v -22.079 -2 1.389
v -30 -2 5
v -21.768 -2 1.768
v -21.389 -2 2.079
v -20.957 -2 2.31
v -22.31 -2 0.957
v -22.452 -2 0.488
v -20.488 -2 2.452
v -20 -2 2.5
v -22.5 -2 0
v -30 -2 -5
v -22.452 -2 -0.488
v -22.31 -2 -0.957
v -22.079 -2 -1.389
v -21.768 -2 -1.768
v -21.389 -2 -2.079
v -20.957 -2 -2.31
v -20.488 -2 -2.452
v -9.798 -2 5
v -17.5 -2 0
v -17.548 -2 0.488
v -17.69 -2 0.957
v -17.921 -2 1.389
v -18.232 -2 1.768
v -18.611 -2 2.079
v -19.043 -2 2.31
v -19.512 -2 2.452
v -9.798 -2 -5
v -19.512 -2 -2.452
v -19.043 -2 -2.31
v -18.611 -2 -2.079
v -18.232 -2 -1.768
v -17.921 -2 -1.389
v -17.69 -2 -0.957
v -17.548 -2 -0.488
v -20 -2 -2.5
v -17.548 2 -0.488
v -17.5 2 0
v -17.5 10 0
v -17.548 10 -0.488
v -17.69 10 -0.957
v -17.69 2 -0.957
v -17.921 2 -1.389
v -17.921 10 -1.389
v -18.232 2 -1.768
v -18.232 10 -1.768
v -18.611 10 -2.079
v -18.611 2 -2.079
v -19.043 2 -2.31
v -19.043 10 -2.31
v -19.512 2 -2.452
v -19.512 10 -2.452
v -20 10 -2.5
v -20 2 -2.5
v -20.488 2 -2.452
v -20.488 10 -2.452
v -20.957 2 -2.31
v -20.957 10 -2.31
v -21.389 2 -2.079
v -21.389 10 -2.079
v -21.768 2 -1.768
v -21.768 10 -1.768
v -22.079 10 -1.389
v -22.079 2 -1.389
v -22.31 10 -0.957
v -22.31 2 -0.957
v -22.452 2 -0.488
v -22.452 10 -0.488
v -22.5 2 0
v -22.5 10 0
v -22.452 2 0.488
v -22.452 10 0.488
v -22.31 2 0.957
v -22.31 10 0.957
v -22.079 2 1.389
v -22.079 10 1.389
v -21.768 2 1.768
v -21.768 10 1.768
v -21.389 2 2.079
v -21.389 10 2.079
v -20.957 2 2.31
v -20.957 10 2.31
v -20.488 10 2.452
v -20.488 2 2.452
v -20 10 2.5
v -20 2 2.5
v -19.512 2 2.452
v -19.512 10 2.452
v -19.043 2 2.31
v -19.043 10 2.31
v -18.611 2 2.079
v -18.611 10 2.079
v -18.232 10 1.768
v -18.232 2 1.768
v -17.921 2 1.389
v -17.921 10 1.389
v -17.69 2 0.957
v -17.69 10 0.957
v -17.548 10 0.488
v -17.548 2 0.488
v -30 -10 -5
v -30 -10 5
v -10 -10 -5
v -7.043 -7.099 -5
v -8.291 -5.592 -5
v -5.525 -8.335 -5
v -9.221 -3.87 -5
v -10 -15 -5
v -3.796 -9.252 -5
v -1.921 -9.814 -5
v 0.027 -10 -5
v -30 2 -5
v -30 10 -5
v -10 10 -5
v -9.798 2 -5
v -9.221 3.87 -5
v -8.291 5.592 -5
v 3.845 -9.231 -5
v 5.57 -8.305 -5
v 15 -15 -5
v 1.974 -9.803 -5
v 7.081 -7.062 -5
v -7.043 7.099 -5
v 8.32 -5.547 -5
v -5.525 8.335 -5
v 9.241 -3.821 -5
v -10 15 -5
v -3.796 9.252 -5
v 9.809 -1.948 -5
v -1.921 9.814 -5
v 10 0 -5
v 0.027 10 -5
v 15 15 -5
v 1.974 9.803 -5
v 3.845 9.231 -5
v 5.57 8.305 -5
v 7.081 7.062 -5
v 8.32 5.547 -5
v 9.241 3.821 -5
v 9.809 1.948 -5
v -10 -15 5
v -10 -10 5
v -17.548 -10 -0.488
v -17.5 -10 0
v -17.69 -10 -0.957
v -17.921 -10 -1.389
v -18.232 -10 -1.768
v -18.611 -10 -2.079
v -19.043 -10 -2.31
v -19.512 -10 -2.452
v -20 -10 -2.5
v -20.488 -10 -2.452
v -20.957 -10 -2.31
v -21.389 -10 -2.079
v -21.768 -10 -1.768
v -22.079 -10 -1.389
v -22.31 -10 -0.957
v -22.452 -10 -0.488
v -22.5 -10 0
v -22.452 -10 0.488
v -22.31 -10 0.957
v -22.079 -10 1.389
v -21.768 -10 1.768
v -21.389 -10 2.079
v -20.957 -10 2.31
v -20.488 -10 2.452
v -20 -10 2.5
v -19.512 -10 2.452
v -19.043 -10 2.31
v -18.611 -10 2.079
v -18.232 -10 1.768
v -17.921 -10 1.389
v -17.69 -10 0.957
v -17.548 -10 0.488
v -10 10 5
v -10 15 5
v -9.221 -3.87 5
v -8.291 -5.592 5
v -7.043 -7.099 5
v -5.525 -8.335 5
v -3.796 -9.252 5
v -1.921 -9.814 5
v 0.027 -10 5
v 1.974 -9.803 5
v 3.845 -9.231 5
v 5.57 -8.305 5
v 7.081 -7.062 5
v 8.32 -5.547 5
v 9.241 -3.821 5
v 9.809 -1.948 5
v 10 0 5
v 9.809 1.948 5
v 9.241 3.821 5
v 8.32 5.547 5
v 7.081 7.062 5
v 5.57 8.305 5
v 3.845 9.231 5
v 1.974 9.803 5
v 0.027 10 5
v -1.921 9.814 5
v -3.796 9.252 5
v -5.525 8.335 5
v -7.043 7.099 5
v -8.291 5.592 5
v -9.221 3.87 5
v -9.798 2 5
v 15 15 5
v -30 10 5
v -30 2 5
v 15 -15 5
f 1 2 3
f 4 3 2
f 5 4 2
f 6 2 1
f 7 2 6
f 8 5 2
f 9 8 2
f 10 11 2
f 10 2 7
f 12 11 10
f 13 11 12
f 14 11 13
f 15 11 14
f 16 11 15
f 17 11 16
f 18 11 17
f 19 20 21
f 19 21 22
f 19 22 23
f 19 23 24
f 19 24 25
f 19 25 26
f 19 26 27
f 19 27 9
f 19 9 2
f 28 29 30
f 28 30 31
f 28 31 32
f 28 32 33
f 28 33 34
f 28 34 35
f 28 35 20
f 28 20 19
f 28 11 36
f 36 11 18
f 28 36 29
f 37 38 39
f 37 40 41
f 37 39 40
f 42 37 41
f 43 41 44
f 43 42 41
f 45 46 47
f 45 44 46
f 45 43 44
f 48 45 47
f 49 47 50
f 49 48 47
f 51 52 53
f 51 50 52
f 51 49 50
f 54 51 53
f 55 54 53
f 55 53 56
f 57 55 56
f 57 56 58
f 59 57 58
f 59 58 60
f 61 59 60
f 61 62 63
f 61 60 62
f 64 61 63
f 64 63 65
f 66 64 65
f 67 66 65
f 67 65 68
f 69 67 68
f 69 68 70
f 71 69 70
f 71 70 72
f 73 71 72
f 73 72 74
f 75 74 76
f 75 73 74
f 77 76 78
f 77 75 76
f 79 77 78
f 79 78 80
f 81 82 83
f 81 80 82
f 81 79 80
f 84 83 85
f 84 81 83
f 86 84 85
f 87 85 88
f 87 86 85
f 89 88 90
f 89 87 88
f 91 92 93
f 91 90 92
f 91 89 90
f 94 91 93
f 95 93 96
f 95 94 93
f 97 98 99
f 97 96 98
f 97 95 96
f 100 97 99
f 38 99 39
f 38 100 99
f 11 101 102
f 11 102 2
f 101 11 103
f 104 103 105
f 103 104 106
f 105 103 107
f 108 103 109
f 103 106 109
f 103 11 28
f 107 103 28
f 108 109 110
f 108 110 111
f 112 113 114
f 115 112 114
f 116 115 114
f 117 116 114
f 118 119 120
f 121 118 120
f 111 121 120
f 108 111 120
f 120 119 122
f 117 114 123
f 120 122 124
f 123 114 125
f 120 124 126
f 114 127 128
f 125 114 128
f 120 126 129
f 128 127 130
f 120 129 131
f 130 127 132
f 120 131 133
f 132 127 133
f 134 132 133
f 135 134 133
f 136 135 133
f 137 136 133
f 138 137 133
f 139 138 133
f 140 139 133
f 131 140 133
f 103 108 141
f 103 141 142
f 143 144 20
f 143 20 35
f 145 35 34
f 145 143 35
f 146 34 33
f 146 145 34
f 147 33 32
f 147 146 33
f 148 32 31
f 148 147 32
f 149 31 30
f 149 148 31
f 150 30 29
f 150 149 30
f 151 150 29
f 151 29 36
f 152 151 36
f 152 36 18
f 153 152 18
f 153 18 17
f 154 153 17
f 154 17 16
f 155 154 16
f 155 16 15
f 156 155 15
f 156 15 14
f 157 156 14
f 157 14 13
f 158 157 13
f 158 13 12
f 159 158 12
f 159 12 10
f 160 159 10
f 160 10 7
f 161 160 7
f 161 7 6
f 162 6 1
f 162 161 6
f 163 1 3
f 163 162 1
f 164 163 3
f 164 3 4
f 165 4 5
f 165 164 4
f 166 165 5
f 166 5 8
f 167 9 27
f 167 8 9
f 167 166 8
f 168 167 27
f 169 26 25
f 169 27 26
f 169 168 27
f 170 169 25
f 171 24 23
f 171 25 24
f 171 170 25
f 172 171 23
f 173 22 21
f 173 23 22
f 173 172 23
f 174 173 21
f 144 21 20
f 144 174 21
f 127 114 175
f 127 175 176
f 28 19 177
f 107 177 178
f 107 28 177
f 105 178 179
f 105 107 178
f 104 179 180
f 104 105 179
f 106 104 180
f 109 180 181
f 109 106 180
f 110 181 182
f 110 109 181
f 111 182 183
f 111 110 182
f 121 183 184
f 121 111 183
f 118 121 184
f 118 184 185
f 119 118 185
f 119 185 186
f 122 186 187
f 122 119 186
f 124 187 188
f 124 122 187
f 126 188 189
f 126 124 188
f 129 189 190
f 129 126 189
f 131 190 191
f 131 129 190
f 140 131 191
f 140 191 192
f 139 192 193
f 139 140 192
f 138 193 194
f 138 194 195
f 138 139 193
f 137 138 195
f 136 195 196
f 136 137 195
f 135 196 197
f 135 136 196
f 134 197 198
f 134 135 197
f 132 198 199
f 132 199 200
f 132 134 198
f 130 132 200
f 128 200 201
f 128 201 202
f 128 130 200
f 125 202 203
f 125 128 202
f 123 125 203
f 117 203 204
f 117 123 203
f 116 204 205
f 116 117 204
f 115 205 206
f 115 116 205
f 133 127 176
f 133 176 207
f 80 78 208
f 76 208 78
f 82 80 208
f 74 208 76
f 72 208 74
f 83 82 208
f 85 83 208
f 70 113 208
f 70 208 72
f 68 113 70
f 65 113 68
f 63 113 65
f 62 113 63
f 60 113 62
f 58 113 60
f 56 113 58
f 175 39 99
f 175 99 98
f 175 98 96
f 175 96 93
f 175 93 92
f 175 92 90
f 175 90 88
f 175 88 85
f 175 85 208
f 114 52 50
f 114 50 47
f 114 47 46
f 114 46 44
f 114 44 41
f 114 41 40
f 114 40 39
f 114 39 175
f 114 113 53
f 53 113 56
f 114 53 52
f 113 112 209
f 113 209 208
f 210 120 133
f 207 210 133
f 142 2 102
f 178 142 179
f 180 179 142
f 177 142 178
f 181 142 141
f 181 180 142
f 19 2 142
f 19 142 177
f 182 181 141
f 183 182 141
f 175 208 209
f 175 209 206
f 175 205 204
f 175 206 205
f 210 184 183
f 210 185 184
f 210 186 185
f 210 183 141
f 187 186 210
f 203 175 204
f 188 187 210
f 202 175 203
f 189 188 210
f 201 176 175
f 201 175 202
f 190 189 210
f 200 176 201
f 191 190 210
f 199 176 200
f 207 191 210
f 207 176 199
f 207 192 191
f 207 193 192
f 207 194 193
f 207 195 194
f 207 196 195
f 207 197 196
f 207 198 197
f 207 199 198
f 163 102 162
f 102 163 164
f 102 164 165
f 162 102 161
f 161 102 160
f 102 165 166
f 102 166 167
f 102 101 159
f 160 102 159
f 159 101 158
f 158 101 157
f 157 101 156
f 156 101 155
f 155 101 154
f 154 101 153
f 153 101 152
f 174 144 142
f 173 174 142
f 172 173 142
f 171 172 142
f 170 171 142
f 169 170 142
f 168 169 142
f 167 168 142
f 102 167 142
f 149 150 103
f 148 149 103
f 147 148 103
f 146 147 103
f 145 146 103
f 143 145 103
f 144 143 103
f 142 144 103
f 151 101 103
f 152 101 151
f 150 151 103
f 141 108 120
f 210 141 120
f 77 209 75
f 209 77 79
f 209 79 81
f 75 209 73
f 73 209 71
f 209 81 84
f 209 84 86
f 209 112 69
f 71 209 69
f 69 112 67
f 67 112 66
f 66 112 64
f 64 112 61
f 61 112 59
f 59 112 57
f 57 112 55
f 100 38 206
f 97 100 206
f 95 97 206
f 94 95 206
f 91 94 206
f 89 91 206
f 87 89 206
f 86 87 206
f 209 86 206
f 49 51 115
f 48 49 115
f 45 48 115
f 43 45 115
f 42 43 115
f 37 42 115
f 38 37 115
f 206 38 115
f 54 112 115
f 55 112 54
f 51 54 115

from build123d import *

# Parameters (mm, degrees)
CYLINDER001_R          = 2.5
CYLINDER001_DEPTH      = 30
CYLINDER001_ROLL_ANGLE = -90
BOX001_W               = 25
BOX001_H               = 4
BOX001_DEPTH           = 10
BOX002_W               = 20
BOX002_H               = 5
BOX002_DEPTH           = 10
BOX003_W               = 20
BOX003_H               = 5
BOX003_DEPTH           = 10
CYLINDER_R             = 10
CYLINDER_DEPTH         = 10
BOX_W                  = 45
BOX_H                  = 30
BOX_DEPTH              = 10


with BuildPart() as cylinder001:
    # Cylinder001 → Cylinder001 (new body)
    with BuildSketch(Plane.XY):
        Circle(CYLINDER001_R)
    extrude(amount=CYLINDER001_DEPTH)


with BuildPart() as cylinder001_1:
    # Cylinder001 roll: moved
    add(cylinder001.part.rotate(Axis((0, 0, 0), (1, 0, 0)), CYLINDER001_ROLL_ANGLE))


with BuildPart() as cylinder001_2:
    # Cylinder001 placement: moved
    add(cylinder001_1.part.moved(Location((-20, -15, 0))))


with BuildPart() as cube001:
    # Box001 → Box001 (new body)
    with BuildSketch(Plane(origin=(-30, -2, -5), x_dir=(1, 0, 0), z_dir=(0, 0, 1))):
        with Locations((12.5, 2)):
            Rectangle(BOX001_W, BOX001_H)
    extrude(amount=BOX001_DEPTH)


with BuildPart() as cube002:
    # Box002 → Box002 (new body)
    with BuildSketch(Plane(origin=(-30, -15, -5), x_dir=(1, 0, 0), z_dir=(0, 0, 1))):
        with Locations((10, 2.5)):
            Rectangle(BOX002_W, BOX002_H)
    extrude(amount=BOX002_DEPTH)


with BuildPart() as cube003:
    # Box003 → Box003 (new body)
    with BuildSketch(Plane(origin=(-30, 10, -5), x_dir=(1, 0, 0), z_dir=(0, 0, 1))):
        with Locations((10, 2.5)):
            Rectangle(BOX003_W, BOX003_H)
    extrude(amount=BOX003_DEPTH)


with BuildPart() as negative_fusion:
    # Cylinder → Cylinder (new body)
    with BuildSketch(Plane.XY.offset(-5)):
        Circle(CYLINDER_R)
    extrude(amount=CYLINDER_DEPTH)

    # Fusion: union Cylinder001, Cube001, Cube002, Cube003
    add(cylinder001_2.part)
    add(cube001.part)
    add(cube002.part)
    add(cube003.part)


with BuildPart() as cut:
    # Box → Box (new body)
    with BuildSketch(Plane(origin=(-30, -15, -5), x_dir=(1, 0, 0), z_dir=(0, 0, 1))):
        with Locations((22.5, 15)):
            Rectangle(BOX_W, BOX_H)
    extrude(amount=BOX_DEPTH)

    # Cut: cut Negative Fusion
    add(negative_fusion.part, mode=Mode.SUBTRACT)


solid = cut.part
